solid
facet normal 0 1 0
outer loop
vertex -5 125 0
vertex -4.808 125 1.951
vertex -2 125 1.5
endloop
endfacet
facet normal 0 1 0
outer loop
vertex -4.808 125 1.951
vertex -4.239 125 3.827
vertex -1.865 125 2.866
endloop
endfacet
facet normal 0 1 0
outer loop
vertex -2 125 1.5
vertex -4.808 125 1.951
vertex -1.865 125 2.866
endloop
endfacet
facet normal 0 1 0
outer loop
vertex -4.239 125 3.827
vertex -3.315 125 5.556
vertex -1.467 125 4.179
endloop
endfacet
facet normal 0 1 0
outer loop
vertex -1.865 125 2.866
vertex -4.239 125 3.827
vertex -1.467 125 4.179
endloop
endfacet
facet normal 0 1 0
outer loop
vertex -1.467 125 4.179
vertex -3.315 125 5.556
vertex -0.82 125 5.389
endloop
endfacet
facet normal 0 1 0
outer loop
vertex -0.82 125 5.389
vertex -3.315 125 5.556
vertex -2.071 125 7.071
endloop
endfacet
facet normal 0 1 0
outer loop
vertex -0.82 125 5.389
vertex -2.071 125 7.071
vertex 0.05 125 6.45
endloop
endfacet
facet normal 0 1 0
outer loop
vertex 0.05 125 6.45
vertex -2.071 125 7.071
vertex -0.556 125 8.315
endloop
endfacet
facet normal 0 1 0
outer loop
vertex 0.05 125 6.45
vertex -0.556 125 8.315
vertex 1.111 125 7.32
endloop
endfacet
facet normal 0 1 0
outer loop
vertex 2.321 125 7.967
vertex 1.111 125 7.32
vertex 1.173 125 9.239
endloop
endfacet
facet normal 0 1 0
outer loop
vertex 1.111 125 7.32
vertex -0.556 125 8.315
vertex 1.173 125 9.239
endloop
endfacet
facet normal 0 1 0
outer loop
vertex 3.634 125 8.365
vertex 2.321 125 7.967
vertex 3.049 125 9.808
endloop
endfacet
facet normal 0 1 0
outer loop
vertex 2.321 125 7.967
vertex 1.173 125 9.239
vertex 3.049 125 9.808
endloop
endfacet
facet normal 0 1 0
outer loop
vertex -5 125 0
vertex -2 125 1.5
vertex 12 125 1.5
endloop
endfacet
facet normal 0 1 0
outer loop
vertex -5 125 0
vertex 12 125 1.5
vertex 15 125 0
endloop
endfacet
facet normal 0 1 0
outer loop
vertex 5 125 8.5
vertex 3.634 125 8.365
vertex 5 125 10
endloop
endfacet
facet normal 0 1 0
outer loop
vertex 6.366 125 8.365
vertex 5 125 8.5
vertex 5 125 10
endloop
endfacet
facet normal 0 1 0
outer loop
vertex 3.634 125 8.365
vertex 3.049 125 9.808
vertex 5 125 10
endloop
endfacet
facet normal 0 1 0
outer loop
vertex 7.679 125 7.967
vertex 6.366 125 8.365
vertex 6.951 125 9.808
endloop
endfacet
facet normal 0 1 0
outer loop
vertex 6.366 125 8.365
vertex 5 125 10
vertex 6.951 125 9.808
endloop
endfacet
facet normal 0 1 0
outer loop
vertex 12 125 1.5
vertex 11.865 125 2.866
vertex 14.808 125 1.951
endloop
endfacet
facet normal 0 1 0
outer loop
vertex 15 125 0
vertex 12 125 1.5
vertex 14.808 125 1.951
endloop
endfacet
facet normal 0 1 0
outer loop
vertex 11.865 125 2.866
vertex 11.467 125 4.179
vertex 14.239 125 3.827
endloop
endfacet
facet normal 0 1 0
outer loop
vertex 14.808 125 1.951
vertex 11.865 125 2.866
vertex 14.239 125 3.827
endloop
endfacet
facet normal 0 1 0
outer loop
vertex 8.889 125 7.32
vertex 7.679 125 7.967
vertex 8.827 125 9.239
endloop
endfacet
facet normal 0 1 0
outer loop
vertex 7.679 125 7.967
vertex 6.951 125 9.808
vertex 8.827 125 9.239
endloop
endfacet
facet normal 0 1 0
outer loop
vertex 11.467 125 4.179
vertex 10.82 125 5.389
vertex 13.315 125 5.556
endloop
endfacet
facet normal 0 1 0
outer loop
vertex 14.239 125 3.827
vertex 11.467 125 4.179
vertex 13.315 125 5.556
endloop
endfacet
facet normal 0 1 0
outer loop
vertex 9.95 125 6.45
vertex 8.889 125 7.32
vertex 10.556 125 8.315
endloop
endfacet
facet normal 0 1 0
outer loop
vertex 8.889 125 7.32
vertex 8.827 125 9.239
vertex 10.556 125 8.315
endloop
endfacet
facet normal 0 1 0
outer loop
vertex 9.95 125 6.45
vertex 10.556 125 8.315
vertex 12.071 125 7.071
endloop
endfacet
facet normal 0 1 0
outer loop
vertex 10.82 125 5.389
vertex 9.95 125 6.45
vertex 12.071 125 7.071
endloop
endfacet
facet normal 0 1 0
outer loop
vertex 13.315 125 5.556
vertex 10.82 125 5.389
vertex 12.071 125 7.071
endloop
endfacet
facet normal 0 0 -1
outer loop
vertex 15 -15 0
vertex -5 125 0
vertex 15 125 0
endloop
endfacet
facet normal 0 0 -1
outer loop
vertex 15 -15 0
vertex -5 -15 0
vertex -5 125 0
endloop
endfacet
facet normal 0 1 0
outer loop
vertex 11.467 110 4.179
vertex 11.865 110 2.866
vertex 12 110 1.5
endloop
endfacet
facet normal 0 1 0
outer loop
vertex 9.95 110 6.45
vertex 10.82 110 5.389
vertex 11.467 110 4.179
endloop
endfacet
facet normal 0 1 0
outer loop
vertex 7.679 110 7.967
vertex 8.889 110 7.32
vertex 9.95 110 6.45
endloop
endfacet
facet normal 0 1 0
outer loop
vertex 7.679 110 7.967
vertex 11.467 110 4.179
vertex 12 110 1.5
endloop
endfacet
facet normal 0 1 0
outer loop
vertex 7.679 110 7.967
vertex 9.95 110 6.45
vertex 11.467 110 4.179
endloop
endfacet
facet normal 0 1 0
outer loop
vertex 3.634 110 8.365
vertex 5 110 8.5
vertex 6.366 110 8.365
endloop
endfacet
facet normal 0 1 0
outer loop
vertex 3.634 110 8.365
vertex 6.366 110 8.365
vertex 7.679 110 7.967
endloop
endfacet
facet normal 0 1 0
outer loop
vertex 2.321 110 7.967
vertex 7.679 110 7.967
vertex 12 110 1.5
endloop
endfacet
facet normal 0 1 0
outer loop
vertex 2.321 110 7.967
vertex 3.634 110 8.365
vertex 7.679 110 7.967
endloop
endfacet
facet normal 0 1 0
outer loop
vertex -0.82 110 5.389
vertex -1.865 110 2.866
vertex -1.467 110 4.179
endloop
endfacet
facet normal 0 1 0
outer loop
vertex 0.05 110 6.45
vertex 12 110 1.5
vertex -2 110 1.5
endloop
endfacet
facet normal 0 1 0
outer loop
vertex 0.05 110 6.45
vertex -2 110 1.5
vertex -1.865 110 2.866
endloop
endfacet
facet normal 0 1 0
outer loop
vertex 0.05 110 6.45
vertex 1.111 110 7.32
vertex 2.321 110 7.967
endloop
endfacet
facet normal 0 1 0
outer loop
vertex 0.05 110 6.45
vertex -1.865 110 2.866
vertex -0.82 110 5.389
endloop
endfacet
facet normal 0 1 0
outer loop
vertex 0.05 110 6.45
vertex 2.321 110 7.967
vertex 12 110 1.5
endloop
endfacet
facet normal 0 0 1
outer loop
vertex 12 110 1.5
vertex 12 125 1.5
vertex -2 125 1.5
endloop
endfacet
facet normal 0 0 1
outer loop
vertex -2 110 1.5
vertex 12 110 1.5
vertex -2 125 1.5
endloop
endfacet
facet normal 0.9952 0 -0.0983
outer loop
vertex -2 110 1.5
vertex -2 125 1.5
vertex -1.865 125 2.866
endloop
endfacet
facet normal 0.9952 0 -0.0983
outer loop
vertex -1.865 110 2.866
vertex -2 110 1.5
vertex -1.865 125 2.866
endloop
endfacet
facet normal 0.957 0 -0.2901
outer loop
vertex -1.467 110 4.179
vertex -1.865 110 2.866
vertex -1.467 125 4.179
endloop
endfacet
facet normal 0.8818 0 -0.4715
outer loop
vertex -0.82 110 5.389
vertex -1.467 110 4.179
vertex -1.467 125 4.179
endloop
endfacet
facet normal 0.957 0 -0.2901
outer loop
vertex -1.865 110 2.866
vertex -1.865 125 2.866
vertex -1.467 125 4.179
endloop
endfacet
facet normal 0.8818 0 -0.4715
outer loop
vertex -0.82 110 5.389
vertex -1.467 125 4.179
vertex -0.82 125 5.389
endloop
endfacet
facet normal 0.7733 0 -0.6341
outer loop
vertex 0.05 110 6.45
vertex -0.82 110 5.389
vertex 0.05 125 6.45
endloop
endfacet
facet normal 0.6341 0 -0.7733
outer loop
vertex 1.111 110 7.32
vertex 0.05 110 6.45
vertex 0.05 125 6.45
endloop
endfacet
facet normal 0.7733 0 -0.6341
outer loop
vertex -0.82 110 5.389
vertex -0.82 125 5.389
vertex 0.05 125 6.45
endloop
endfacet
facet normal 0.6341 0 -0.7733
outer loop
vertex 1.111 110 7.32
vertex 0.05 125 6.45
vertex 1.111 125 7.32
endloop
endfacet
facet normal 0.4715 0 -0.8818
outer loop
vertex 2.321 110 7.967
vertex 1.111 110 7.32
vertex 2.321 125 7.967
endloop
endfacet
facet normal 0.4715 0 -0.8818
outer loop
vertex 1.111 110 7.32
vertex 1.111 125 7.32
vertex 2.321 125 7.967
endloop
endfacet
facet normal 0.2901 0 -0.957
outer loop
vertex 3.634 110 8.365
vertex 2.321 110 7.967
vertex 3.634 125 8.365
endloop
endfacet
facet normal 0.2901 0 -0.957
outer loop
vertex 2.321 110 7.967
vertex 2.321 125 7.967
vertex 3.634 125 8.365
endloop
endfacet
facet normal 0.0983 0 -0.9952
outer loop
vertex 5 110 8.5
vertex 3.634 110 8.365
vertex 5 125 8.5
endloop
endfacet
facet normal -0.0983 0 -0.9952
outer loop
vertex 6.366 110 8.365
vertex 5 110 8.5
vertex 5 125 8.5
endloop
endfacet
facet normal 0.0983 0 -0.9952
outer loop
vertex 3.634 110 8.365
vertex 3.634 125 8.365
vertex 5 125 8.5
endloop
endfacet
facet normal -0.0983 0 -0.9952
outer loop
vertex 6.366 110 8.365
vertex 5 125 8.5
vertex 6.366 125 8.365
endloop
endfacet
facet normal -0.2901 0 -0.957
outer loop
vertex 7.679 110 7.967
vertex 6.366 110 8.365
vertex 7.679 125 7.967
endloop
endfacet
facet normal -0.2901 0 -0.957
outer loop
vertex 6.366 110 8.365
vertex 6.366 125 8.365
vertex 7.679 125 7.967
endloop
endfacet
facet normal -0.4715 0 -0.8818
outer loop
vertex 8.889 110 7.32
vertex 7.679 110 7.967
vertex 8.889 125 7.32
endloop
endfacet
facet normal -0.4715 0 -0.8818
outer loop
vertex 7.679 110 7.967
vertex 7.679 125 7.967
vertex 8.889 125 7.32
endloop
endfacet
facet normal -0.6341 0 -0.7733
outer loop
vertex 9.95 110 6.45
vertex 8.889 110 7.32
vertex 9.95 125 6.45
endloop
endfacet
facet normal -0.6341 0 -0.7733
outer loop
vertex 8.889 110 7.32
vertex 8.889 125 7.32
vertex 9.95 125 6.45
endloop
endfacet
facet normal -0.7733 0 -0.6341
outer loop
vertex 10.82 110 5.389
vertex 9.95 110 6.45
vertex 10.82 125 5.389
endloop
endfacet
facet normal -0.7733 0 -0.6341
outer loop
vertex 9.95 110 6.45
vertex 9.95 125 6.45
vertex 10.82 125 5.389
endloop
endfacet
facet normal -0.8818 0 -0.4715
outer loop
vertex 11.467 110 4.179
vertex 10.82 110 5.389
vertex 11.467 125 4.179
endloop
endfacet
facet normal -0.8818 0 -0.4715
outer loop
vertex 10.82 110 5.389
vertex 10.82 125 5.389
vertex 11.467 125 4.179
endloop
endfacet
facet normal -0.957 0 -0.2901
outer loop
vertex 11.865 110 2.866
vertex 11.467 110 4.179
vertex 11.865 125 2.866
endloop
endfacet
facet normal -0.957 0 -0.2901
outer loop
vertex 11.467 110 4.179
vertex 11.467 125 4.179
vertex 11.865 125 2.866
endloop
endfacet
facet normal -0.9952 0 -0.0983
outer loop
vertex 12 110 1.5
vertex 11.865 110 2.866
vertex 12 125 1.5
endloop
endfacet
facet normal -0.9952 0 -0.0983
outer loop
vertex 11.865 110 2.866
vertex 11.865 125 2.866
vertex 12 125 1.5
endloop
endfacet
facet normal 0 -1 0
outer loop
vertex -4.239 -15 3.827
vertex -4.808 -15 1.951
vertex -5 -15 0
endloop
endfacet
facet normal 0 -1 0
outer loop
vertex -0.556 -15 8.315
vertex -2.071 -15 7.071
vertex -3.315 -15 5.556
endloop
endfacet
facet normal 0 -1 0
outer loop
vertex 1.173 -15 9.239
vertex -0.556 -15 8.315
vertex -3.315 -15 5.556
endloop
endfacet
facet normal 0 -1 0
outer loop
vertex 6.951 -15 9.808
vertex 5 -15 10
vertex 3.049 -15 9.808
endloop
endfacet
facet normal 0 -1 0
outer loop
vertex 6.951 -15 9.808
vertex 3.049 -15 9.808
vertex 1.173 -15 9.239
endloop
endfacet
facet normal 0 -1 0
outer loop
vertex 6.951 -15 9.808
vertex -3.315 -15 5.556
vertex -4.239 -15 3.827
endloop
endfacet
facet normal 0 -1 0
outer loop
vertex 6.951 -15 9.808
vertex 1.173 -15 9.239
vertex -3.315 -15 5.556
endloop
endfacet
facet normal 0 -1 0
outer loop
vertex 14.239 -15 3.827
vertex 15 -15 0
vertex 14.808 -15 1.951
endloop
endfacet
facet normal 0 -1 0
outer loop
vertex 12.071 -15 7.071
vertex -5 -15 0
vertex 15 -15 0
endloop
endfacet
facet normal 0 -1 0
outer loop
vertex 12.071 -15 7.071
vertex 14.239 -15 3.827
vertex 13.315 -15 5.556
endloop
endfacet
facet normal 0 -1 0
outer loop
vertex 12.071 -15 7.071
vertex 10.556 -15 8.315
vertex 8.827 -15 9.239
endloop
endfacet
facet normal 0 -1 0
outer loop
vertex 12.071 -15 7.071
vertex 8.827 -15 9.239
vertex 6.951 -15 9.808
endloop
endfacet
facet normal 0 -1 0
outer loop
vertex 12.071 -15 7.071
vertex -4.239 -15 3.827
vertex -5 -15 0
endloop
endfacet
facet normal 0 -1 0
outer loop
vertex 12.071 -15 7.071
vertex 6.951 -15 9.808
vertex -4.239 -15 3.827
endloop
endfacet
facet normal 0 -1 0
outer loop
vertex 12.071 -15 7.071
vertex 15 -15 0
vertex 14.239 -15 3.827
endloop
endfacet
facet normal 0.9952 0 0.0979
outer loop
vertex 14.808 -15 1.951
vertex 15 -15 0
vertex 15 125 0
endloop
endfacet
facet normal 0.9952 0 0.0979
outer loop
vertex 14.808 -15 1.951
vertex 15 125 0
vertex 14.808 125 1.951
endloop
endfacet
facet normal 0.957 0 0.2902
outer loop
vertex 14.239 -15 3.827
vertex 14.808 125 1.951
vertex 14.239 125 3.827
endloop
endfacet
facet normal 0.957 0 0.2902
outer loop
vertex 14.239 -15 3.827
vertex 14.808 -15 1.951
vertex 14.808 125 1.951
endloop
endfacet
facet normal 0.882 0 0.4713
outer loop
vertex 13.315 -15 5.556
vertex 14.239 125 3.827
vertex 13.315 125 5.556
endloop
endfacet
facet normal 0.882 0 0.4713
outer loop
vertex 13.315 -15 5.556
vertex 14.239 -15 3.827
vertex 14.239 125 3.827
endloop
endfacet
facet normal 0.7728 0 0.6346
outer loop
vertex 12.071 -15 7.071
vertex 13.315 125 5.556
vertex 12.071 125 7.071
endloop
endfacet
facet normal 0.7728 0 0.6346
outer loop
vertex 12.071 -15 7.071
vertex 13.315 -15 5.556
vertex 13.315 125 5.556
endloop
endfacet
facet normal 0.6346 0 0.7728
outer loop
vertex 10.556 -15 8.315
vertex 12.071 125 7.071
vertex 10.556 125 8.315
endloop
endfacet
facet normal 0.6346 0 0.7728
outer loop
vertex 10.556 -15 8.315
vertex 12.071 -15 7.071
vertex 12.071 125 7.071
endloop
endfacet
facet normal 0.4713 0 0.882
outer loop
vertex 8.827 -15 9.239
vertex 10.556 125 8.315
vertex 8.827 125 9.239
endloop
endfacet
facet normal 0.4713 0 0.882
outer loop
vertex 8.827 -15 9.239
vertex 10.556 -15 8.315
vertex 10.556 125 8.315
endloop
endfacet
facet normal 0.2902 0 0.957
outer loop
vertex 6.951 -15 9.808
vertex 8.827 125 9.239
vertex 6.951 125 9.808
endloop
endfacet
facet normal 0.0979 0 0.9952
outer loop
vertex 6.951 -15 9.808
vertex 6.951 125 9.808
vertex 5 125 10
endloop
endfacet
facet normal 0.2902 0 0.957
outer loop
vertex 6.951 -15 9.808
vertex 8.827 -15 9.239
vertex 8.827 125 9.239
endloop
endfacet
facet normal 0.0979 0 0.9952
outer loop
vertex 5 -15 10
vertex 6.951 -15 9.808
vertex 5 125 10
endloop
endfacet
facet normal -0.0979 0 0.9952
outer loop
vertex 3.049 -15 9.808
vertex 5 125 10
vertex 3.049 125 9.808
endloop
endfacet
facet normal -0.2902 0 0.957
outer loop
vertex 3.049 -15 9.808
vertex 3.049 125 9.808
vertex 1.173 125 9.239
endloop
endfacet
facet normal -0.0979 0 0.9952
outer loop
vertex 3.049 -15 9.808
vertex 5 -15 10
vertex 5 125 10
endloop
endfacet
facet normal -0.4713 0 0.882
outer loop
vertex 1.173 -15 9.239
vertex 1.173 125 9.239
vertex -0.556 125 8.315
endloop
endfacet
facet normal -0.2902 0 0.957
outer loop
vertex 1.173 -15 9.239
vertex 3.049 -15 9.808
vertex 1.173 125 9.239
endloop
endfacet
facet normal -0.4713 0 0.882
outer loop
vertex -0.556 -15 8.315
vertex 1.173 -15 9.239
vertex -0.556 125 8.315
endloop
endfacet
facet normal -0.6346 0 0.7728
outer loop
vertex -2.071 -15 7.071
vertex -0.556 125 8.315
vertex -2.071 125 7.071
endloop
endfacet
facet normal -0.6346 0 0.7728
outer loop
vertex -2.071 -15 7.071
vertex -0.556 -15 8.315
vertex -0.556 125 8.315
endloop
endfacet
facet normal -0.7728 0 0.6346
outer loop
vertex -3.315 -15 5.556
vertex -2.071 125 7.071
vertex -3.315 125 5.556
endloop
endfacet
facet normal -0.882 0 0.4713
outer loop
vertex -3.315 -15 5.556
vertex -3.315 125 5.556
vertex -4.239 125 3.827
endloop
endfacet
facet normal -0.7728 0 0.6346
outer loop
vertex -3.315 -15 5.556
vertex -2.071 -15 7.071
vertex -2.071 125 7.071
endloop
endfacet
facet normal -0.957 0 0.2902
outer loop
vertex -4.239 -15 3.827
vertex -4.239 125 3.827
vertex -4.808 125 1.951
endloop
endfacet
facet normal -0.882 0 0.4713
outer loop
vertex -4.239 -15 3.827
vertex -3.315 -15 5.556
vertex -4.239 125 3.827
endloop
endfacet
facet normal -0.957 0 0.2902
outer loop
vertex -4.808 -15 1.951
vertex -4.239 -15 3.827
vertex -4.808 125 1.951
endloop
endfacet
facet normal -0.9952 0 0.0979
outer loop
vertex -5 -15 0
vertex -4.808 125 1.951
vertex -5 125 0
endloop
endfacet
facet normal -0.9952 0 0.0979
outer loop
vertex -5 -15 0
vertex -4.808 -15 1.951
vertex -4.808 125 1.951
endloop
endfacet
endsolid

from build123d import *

# Parameters (mm, degrees)
F1_DEPTH = 15
F2_DEPTH = 125
F4_DEPTH = 15


with BuildPart() as f1:
    # F0 (on Front) → F1 (new body)
    with BuildSketch(Plane.XZ):
        with BuildLine():
            Line((-5, 0), (0, 0))
            Line((0, 0), (0, 5))
            Line((0, 5), (5, 5))
            Line((5, 5), (10, 5))
            Line((10, 5), (10, 0))
            Line((10, 0), (15, 0))
            ThreePointArc((15, 0), (5, 10), (-5, 0))
        make_face()
        with BuildLine():
            ThreePointArc((5, 5), (1.4644660941, 3.5355339059), (0, 0))
            Line((0, 0), (10, 0))
            ThreePointArc((10, 0), (8.5355339059, 3.5355339059), (5, 5))
        make_face()
        with BuildLine():
            Line((0, 5), (0, 0))
            ThreePointArc((0, 0), (1.4644660941, 3.5355339059), (5, 5))
            Line((5, 5), (0, 5))
        make_face()
        with BuildLine():
            ThreePointArc((5, 5), (8.5355339059, 3.5355339059), (10, 0))
            Line((10, 0), (10, 5))
            Line((10, 5), (5, 5))
        make_face()
    extrude(amount=F1_DEPTH)

    # F0 (on Front) + F1_face (on face) → F2 (join)
    with BuildSketch(Plane.XZ):
        with BuildLine():
            Line((-5, 0), (0, 0))
            Line((0, 0), (0, 5))
            Line((0, 5), (5, 5))
            Line((5, 5), (10, 5))
            Line((10, 5), (10, 0))
            Line((10, 0), (15, 0))
            ThreePointArc((15, 0), (5, 10), (-5, 0))
        make_face()
        with BuildLine():
            ThreePointArc((5, 5), (8.5355339059, 3.5355339059), (10, 0))
            Line((10, 0), (10, 5))
            Line((10, 5), (5, 5))
        make_face()
        with BuildLine():
            Line((0, 5), (0, 0))
            ThreePointArc((0, 0), (1.4644660941, 3.5355339059), (5, 5))
            Line((5, 5), (0, 5))
        make_face()
    with BuildSketch(Plane(origin=(5, 0, 4.2441318158), x_dir=(1, 0, 0), z_dir=(0, 1, 0))):
        with BuildLine():
            Line((10, 4.2441318158), (-10, 4.2441318158))
            ThreePointArc((-10, 4.2441318158), (0, -5.7558681842), (10, 4.2441318158))
        make_face()
    extrude(amount=-F2_DEPTH, dir=(0, -1, 0))

    # F3 (on face) → F4 (cut)
    with BuildSketch(Plane(origin=(0, 125, 0), x_dir=(-1, 0, 0), z_dir=(0, 1, 0))):
        with BuildLine():
            Line((-12, 1.5), (2, 1.5))
            ThreePointArc((2, 1.5), (-5, 8.5), (-12, 1.5))
        make_face()
    extrude(amount=-F4_DEPTH, mode=Mode.SUBTRACT)


solid = f1.part
